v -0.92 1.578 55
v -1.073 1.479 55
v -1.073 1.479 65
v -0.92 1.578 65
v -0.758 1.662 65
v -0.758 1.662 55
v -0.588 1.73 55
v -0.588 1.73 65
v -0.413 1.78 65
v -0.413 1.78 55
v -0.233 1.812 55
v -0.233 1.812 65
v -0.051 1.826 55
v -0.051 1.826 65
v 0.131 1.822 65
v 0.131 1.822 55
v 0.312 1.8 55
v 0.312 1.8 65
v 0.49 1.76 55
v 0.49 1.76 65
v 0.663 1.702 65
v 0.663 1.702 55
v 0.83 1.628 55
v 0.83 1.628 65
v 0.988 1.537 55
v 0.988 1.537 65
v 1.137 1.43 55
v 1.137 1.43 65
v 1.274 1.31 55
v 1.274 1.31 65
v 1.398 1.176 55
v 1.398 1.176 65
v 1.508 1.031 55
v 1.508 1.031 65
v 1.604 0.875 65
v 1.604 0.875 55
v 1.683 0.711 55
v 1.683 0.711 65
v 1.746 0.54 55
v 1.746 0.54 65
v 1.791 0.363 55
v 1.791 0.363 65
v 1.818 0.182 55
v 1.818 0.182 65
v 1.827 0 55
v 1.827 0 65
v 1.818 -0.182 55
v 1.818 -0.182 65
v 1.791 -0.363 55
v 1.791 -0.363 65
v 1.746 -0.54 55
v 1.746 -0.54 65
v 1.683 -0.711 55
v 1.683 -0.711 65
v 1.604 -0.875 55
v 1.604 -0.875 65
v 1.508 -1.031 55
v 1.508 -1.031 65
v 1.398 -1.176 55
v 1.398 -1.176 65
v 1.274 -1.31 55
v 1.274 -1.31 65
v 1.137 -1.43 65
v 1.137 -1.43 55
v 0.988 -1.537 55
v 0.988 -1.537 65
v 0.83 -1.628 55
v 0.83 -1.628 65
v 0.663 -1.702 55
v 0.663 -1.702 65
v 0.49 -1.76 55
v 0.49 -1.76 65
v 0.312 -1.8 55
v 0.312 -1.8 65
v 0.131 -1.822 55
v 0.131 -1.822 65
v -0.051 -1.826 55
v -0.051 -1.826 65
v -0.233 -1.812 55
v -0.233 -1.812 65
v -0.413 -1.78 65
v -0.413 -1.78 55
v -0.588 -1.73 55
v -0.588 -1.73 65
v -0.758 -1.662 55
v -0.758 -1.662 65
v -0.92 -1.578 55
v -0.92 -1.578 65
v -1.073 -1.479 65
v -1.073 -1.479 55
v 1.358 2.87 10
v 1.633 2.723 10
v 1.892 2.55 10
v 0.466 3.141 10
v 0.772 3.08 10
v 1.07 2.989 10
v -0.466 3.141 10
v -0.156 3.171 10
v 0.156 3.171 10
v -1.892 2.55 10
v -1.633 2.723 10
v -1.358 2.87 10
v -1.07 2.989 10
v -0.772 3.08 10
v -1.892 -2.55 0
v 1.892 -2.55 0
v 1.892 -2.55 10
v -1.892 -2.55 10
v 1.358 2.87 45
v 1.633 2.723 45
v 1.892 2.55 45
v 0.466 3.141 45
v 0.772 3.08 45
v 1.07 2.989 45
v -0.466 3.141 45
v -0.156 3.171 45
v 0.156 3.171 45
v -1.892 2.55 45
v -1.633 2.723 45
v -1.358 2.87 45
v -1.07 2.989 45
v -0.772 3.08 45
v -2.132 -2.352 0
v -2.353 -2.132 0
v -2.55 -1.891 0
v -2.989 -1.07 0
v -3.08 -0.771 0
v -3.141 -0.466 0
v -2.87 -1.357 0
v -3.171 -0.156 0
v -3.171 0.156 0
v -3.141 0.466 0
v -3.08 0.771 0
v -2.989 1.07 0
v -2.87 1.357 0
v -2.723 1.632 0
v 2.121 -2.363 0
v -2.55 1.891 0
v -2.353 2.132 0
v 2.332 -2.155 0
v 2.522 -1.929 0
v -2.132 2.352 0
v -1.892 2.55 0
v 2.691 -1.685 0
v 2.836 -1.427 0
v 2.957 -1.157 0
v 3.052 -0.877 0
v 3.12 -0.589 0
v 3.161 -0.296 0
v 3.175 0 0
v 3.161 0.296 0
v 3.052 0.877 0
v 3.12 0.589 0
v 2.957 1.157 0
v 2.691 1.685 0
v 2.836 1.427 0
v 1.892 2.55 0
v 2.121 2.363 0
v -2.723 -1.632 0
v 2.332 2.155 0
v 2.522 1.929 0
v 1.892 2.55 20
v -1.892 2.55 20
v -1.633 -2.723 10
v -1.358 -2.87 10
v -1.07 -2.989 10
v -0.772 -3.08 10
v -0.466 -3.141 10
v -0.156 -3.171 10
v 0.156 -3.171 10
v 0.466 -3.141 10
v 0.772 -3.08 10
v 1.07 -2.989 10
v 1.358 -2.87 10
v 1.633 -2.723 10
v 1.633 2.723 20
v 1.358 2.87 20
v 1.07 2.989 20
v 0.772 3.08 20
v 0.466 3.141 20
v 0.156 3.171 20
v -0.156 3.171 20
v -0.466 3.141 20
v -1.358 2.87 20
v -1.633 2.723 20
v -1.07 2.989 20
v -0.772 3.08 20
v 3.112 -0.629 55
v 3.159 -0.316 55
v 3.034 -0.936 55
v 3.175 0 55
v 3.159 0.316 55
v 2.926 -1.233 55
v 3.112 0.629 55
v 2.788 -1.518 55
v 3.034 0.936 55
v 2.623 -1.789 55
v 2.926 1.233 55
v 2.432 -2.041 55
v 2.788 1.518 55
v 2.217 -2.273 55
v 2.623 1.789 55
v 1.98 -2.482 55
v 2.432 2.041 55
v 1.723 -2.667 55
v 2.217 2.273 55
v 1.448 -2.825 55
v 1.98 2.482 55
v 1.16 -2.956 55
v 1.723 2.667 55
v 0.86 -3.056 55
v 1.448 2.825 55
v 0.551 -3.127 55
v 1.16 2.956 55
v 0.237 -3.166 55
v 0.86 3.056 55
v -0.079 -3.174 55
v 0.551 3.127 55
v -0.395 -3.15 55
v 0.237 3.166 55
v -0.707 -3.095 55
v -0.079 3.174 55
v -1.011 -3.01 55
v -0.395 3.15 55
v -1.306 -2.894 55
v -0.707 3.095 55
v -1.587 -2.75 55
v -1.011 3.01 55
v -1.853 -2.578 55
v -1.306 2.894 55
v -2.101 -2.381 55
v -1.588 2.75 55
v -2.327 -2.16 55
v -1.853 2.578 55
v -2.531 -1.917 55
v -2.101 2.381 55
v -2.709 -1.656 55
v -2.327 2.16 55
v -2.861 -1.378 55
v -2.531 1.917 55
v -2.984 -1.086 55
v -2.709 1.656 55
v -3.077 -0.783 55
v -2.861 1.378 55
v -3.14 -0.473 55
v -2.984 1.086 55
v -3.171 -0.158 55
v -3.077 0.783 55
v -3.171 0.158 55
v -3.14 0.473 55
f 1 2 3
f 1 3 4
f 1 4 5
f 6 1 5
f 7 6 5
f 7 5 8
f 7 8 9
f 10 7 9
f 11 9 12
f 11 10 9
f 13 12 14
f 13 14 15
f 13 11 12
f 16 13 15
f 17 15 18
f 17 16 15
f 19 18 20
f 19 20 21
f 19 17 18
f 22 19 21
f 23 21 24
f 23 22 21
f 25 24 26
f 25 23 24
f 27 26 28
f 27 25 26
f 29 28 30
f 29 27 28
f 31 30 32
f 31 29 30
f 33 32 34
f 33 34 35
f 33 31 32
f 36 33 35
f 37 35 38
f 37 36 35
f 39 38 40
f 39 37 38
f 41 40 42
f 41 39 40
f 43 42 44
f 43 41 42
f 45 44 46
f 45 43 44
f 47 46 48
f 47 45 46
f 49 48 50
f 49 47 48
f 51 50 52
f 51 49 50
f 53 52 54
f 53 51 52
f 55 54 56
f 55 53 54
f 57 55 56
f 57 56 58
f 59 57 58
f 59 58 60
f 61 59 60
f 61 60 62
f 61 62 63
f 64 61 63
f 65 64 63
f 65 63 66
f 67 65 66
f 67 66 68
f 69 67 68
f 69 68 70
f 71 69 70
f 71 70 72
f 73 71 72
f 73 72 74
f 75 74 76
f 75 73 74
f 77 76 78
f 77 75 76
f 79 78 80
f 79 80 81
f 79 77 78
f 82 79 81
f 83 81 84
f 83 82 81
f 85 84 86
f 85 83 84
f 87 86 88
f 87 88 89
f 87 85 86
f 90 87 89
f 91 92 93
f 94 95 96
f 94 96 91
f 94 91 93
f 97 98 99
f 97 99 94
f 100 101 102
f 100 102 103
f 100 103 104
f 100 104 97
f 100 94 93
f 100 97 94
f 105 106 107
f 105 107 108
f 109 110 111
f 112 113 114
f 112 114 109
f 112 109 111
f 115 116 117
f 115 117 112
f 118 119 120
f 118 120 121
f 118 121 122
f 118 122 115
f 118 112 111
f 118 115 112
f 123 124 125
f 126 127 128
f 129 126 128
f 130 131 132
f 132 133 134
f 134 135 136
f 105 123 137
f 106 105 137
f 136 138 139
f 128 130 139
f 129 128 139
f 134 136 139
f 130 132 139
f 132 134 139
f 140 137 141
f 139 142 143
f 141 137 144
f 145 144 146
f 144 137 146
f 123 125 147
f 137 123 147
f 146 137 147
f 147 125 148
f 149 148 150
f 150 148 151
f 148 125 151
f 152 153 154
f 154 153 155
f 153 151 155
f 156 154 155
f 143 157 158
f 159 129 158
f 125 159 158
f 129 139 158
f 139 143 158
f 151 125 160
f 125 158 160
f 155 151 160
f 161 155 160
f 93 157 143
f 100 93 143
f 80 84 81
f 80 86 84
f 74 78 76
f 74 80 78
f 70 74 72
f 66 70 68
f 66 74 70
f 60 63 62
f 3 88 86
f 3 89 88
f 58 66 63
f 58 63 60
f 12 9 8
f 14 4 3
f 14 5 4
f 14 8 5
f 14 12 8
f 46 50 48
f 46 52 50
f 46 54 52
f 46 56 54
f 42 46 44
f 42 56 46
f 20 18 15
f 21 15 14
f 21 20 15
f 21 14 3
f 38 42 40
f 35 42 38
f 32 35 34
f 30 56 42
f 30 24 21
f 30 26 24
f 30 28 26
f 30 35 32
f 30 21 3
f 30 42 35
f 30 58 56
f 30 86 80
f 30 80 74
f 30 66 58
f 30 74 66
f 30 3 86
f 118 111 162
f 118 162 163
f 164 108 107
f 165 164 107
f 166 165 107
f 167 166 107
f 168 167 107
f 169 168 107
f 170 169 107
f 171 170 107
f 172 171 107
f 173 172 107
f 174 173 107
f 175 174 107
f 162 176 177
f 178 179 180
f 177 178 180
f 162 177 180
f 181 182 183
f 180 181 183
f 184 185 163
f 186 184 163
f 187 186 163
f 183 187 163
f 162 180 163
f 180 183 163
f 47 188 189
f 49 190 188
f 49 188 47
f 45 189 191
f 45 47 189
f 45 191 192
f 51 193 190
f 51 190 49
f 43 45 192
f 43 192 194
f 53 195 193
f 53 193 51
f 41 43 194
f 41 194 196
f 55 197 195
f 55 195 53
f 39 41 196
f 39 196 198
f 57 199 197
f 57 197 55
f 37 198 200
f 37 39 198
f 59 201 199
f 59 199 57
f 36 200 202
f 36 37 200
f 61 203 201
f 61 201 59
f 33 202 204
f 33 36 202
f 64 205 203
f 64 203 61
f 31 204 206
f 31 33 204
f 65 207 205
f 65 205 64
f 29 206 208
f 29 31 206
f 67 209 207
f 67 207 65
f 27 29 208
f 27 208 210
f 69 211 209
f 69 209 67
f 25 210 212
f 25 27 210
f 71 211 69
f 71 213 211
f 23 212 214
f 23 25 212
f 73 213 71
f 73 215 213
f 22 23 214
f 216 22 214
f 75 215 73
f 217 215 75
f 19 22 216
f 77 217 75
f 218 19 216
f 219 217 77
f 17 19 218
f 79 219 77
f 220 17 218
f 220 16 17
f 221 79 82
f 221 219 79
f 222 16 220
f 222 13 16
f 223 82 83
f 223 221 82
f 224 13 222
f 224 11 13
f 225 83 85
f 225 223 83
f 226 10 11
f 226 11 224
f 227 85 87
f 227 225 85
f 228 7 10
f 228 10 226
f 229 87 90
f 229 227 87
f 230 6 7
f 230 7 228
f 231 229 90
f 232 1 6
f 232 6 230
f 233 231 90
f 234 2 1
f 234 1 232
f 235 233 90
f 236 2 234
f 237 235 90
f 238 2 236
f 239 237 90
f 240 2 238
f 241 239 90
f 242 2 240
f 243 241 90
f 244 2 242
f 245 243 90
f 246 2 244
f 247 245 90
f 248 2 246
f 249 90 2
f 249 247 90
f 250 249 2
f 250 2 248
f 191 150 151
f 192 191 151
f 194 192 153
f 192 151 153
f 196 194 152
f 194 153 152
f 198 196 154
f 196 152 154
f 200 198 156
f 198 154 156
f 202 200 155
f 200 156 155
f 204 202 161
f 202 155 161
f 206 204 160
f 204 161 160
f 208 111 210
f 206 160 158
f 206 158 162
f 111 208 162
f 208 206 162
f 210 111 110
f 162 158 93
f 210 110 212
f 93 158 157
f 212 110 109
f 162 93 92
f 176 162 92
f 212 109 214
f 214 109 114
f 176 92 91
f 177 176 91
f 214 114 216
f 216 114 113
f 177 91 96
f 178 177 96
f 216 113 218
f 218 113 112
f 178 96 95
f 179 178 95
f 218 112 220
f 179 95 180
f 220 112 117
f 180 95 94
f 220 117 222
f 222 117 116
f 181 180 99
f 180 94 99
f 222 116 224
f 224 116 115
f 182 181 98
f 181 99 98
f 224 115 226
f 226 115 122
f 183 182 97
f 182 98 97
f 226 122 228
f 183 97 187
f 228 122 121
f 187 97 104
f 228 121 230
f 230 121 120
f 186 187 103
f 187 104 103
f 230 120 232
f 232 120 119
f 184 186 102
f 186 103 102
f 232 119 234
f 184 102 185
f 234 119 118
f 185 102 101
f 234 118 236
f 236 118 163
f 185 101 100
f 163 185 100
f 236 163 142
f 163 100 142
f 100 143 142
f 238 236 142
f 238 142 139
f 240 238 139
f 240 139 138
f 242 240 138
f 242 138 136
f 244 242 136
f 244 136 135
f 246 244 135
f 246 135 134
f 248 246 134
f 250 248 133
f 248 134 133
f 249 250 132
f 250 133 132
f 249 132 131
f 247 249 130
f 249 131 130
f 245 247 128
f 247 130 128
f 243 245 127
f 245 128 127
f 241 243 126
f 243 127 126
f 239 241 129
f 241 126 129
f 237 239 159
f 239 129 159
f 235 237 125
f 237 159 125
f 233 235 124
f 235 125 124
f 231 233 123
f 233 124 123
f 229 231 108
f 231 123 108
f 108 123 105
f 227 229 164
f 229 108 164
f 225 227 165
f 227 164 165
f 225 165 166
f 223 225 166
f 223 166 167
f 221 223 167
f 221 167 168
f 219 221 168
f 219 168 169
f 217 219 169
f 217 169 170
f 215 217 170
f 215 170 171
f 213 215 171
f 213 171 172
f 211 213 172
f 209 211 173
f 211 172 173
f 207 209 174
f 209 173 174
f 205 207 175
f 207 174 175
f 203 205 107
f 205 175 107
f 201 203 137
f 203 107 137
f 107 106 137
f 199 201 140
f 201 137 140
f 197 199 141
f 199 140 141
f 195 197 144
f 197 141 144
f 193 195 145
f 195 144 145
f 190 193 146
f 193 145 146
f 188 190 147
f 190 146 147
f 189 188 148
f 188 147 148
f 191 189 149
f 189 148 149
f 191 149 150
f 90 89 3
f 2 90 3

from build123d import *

# Parameters (mm, degrees)
SKETCH1_R           = 3.175
BOSS_EXTRUDE1_DEPTH = 65
CUT_EXTRUDE1_DEPTH  = 10
CUT_EXTRUDE2_DEPTH  = 25
CUT_EXTRUDE3_START  = -10
SKETCH4_R           = 3.175
CUT_EXTRUDE3_DEPTH  = 10


with BuildPart() as part:
    # Sketch1 → Boss-Extrude1 (new body)
    with BuildSketch(Plane.XY):
        Circle(SKETCH1_R)
    extrude(amount=BOSS_EXTRUDE1_DEPTH)

    # Sketch2 → Cut-Extrude1 (cut)
    with BuildSketch(Plane(origin=(0, 0, 0), x_dir=(-1, 0, 0), z_dir=(0, 0, -1))):
        with BuildLine():
            Line((-1.891593244, 2.55), (1.891593244, 2.55))
            ThreePointArc((1.891593244, 2.55), (0, 3.175), (-1.891593244, 2.55))
        make_face()
        with BuildLine():
            Line((-1.891593244, -2.55), (1.891593244, -2.55))
            ThreePointArc((1.891593244, -2.55), (0, -3.175), (-1.891593244, -2.55))
        make_face()
    extrude(amount=-CUT_EXTRUDE1_DEPTH, mode=Mode.SUBTRACT)

    # Sketch3 → Cut-Extrude2 (cut)
    with BuildSketch(Plane(origin=(0, 0, 20), x_dir=(-1, 0, 0), z_dir=(0, 0, -1))):
        with BuildLine():
            Line((-1.891593244, 2.55), (1.891593244, 2.55))
            ThreePointArc((1.891593244, 2.55), (0, 3.175), (-1.891593244, 2.55))
        make_face()
    extrude(amount=-CUT_EXTRUDE2_DEPTH, mode=Mode.SUBTRACT)

    # Sketch4 → Cut-Extrude3 (cut)
    with BuildSketch(Plane.XY.offset(65).offset(CUT_EXTRUDE3_START)):
        with Locations(Location((0, 0, 0), (0, 0, 126.568071017))):
            Circle(SKETCH4_R)
        with BuildLine():
            Line((-1.073, -1.478715659), (-1.073, 1.478715659))
            ThreePointArc((-1.073, 1.478715659), (1.827, 0), (-1.073, -1.478715659))
        make_face(mode=Mode.SUBTRACT)
    extrude(amount=CUT_EXTRUDE3_DEPTH, mode=Mode.SUBTRACT)


solid = part.part
